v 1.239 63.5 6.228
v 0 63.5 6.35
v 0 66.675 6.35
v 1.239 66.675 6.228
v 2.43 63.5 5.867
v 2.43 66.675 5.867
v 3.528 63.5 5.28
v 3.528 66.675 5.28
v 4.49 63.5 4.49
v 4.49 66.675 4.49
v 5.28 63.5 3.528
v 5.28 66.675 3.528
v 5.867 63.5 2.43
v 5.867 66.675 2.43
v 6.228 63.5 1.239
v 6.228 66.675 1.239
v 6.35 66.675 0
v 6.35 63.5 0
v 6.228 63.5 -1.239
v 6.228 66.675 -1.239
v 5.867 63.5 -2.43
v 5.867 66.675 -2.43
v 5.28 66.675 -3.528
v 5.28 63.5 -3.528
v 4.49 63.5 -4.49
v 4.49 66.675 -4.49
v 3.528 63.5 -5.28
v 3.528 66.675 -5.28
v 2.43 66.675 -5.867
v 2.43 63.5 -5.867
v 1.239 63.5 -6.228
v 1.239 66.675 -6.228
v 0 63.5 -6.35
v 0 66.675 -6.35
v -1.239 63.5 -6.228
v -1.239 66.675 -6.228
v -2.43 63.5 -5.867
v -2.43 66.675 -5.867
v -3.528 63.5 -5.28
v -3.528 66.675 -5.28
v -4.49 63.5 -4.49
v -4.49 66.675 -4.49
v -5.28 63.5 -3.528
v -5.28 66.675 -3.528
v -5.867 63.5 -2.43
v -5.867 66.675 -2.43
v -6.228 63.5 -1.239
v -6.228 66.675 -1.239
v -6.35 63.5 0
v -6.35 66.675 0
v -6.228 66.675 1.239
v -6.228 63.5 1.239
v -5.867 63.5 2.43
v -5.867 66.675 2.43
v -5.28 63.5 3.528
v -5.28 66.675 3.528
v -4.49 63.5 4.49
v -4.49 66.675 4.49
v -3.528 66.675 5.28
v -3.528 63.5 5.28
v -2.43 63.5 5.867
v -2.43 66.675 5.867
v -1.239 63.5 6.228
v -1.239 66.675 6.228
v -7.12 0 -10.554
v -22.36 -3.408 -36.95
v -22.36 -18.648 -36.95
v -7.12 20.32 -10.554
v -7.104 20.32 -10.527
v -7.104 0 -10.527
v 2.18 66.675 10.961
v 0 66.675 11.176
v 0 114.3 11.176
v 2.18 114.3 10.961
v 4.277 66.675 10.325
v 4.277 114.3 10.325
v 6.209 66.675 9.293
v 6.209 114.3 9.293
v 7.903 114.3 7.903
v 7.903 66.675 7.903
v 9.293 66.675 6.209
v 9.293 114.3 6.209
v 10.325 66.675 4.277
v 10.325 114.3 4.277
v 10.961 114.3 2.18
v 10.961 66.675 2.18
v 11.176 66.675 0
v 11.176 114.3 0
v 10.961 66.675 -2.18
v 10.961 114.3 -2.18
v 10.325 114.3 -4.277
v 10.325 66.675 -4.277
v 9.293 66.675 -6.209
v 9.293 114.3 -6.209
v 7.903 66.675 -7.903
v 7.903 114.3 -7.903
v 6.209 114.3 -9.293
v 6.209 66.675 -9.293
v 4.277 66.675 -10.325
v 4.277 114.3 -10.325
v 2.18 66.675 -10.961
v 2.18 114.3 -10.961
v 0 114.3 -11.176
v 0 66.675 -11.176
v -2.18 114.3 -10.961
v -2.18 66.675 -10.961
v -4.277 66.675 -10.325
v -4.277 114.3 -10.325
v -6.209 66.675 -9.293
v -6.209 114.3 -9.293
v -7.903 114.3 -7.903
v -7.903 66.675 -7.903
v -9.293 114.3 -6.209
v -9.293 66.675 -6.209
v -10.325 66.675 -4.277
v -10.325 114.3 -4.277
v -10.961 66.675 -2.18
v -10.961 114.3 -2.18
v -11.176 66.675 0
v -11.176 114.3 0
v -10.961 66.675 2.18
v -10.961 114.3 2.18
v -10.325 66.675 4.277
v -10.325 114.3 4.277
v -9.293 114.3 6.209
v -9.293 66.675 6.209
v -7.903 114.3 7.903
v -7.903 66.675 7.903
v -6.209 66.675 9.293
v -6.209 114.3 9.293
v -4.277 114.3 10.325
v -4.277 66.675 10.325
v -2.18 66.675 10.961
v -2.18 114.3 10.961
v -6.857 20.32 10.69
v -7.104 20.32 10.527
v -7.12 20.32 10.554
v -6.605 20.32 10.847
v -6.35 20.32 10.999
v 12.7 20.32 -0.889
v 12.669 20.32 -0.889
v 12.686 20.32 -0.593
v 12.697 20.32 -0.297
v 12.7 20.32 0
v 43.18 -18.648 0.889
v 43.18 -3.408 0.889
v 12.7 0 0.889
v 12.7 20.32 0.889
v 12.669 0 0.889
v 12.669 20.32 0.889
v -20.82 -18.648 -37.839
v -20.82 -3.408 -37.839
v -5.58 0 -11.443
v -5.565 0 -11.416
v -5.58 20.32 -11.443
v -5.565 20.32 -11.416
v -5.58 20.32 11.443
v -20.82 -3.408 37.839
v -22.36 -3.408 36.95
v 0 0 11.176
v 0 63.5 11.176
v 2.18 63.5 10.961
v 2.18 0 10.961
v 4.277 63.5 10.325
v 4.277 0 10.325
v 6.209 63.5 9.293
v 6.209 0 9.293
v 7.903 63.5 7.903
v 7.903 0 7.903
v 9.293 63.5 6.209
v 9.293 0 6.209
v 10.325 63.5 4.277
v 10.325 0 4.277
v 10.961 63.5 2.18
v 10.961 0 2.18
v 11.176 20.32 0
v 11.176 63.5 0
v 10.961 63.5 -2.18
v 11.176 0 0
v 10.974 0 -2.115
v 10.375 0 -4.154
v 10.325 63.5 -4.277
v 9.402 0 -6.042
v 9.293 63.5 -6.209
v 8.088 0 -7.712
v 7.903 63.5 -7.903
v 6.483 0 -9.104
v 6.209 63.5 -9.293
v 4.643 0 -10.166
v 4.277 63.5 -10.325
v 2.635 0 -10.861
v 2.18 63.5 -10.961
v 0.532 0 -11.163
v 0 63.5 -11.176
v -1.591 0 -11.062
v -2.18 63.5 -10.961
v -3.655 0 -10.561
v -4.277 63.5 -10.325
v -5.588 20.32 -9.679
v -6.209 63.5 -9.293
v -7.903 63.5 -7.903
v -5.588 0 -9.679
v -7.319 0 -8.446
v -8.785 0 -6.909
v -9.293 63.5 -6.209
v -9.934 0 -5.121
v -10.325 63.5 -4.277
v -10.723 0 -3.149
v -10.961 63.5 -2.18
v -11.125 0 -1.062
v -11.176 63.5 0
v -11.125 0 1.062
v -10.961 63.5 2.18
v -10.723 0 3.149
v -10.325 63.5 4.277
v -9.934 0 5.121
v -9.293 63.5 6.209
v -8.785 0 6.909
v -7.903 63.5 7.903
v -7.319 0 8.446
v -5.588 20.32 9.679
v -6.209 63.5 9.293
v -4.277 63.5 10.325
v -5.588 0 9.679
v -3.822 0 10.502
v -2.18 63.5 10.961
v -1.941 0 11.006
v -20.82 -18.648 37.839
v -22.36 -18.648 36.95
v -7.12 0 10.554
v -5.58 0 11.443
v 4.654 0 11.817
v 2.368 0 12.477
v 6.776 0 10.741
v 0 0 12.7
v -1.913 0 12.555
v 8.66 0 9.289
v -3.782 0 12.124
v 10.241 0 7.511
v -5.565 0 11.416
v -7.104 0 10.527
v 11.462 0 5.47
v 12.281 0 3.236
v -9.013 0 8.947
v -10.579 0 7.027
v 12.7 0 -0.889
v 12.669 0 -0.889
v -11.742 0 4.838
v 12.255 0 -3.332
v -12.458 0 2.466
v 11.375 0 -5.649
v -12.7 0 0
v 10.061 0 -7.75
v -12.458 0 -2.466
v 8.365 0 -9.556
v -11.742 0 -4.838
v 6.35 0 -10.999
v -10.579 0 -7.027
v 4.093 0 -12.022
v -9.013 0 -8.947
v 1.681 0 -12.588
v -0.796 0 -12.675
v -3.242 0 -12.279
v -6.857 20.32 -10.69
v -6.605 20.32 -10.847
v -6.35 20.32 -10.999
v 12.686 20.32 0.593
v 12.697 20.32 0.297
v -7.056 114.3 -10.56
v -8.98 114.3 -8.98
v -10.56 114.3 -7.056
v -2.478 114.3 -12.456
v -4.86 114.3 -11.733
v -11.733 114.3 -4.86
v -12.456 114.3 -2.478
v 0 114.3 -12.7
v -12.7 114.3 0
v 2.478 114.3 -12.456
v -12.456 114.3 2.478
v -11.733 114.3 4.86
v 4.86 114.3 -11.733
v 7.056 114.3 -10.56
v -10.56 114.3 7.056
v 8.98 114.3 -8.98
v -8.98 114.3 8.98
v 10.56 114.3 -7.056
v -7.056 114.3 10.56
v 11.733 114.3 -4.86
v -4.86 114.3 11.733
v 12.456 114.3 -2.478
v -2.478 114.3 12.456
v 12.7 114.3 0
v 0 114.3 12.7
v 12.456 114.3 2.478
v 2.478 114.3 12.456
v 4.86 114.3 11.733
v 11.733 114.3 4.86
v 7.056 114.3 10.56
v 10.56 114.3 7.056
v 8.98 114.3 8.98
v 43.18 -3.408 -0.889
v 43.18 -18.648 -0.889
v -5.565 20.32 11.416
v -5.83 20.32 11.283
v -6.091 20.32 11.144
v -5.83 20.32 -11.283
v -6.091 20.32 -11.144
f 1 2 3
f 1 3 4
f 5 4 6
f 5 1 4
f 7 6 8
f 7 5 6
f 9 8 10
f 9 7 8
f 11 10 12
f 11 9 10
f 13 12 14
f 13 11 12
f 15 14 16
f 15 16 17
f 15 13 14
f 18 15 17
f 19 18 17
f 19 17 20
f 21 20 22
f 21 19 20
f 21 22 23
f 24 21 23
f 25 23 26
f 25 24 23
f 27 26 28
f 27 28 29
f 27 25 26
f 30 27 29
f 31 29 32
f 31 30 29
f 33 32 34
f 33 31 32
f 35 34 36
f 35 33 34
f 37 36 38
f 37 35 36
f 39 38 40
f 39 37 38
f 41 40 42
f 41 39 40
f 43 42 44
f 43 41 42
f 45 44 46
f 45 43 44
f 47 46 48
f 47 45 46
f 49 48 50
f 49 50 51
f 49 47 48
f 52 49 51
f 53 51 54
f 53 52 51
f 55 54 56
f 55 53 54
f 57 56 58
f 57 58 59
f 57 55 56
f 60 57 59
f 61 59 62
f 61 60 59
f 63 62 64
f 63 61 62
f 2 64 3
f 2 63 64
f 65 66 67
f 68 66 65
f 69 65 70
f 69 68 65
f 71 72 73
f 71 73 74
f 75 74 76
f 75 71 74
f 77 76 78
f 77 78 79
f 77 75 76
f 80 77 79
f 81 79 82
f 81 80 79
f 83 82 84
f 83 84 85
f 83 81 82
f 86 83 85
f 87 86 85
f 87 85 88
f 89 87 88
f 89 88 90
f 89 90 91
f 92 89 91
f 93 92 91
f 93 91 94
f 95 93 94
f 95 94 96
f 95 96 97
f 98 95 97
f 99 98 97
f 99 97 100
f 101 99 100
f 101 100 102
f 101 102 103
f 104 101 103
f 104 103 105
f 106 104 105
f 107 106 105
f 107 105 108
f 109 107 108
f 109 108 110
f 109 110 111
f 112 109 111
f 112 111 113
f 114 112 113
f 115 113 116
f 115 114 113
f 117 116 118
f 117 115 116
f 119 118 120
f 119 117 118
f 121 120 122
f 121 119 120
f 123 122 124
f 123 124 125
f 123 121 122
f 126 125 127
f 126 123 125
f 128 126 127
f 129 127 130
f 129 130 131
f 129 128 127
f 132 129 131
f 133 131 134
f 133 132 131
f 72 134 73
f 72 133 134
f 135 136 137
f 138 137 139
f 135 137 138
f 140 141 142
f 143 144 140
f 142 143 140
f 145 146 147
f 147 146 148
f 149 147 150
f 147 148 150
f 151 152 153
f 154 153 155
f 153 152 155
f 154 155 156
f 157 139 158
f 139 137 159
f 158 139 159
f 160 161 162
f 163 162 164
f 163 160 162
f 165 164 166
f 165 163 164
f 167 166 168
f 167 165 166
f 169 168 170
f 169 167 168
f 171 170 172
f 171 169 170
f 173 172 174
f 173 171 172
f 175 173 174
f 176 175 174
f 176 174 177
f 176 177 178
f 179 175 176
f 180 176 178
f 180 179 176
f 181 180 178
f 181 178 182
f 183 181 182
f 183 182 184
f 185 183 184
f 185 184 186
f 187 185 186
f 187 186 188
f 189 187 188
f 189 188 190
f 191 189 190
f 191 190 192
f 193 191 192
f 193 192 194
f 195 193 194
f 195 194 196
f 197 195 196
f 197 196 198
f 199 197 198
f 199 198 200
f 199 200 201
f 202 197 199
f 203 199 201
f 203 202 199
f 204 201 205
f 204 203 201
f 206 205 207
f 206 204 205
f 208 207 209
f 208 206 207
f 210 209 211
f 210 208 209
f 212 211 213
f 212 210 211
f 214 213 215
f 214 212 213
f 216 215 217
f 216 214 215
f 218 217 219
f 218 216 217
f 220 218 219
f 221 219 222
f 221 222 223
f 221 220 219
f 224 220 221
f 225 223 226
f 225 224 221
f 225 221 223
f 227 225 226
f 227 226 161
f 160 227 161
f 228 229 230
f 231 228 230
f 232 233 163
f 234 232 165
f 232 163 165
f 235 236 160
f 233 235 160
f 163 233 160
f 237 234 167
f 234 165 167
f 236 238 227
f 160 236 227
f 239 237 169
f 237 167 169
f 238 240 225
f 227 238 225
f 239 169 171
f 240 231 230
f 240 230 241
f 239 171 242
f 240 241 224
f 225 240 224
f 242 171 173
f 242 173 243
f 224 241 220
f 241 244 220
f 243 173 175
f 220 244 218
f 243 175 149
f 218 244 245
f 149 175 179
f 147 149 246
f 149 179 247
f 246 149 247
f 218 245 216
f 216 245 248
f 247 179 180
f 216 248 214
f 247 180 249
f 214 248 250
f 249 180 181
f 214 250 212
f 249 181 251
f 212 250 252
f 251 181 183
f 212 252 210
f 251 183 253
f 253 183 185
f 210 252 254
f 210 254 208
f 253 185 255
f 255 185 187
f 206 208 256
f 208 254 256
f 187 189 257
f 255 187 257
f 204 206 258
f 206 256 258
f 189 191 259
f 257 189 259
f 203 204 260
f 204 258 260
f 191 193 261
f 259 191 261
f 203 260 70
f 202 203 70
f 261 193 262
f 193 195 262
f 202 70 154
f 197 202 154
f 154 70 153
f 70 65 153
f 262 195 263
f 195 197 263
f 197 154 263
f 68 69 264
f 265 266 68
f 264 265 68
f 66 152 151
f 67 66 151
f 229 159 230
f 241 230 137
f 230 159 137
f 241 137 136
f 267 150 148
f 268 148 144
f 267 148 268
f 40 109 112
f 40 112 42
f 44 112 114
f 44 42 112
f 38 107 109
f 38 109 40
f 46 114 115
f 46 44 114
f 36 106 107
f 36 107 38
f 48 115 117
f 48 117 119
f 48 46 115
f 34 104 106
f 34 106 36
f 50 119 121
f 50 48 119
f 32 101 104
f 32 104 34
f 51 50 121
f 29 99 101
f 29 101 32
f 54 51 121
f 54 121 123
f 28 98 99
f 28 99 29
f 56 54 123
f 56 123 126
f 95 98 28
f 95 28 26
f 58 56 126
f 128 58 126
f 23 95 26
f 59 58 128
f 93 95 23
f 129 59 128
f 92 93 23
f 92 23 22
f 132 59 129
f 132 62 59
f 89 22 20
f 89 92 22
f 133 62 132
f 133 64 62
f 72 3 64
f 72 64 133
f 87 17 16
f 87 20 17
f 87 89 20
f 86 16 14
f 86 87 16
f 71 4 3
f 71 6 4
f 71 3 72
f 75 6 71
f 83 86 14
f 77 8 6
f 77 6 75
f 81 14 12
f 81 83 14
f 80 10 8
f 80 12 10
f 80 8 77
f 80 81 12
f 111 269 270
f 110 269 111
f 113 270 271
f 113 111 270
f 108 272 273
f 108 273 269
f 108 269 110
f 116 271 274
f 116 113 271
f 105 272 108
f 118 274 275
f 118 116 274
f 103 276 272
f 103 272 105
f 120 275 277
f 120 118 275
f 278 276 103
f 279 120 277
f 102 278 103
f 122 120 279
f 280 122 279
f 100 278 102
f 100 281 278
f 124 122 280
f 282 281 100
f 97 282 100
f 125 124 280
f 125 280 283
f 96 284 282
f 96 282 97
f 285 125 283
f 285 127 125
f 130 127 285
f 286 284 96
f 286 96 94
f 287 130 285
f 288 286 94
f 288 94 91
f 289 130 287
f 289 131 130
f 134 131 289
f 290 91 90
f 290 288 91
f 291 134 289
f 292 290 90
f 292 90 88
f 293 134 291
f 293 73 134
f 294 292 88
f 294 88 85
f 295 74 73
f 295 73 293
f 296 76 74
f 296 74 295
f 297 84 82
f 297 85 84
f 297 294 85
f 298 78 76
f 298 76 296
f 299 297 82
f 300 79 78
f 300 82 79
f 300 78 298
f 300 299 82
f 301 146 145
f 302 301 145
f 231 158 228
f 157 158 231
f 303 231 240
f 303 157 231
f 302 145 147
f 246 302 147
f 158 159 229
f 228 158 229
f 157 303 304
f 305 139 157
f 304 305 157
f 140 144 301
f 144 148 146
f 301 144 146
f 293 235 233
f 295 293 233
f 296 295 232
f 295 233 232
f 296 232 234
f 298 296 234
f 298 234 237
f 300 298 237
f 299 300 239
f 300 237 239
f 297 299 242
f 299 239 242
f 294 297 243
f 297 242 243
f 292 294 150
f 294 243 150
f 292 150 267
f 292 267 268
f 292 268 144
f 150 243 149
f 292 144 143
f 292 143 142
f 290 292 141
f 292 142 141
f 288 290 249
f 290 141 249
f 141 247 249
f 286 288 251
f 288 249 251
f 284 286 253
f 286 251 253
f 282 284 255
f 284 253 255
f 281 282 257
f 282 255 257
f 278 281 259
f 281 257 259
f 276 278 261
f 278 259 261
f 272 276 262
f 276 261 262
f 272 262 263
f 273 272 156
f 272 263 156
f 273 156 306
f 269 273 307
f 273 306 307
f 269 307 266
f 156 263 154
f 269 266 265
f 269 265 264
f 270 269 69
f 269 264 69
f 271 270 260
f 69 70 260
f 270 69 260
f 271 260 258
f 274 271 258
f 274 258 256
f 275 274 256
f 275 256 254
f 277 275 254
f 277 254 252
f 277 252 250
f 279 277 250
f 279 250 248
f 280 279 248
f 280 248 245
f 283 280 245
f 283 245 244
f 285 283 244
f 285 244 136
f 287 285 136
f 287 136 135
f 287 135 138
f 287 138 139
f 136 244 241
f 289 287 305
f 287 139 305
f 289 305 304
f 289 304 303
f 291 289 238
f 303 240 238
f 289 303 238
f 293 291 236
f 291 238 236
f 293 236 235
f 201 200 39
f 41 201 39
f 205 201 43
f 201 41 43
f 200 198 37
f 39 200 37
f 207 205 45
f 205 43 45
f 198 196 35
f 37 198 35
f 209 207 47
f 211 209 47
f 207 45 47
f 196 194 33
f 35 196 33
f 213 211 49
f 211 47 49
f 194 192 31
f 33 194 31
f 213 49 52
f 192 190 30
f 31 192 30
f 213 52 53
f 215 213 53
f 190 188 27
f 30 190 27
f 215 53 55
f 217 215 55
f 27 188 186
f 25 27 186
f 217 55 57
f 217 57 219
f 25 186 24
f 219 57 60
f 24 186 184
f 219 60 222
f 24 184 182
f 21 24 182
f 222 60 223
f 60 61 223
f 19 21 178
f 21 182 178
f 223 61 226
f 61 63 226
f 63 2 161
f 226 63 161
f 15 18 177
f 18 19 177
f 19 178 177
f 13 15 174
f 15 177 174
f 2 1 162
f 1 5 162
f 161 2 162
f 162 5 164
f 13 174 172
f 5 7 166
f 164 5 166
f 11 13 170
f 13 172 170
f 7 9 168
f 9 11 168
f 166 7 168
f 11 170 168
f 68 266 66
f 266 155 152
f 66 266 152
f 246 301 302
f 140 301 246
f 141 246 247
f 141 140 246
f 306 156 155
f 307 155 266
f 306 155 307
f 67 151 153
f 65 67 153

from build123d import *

# Parameters (mm, degrees)
SKETCH1_R           = 12.7
SKETCH1_R_2         = 11.176
BOSS_EXTRUDE1_DEPTH = 114.3
BOSS_EXTRUDE2_DEPTH = 0.889
CIRPATTERN1_COUNT   = 3
SKETCH3_R           = 11.176
SKETCH3_R_2         = 6.35
BOSS_EXTRUDE3_DEPTH = 3.175


with BuildPart() as part:
    # Sketch1 → Boss-Extrude1 (new body)
    with BuildSketch(Plane(origin=(0, 0, 0), x_dir=(1, 0, 0), z_dir=(0, 1, 0))):
        with Locations(Location((0, 0, 0), (0, 0, 270))):
            Circle(SKETCH1_R)
        with Locations(Location((0, 0, 0), (0, 0, 270))):
            Circle(SKETCH1_R_2, mode=Mode.SUBTRACT)
    extrude(amount=BOSS_EXTRUDE1_DEPTH)

    # Sketch2 → Boss-Extrude2 (add, symmetric)
    with BuildSketch(Plane.XY):
        Polygon((12.7, 0), (11.176, 0), (11.176, 20.32), (12.7, 20.32), (43.18, -3.408032613), (43.18, -18.648032613), align=None)
    boss_extrude2 = extrude(amount=BOSS_EXTRUDE2_DEPTH, both=True)

    # CirPattern1: Boss-Extrude2 ×3 about axis
    cirpattern1_axis = Axis((0, 0, 0), (0, 1, 0))
    for i in range(1, CIRPATTERN1_COUNT):
        add(boss_extrude2.rotate(cirpattern1_axis, i * 360 / CIRPATTERN1_COUNT))

    # Sketch3 → Boss-Extrude3 (add)
    with BuildSketch(Plane(origin=(0, 63.5, 0), x_dir=(1, 0, 0), z_dir=(0, 1, 0))):
        with Locations(Location((0, 0, 0), (0, 0, 270))):
            Circle(SKETCH3_R)
        with Locations(Location((0, 0, 0), (0, 0, 270))):
            Circle(SKETCH3_R_2, mode=Mode.SUBTRACT)
    extrude(amount=BOSS_EXTRUDE3_DEPTH)


solid = part.part
